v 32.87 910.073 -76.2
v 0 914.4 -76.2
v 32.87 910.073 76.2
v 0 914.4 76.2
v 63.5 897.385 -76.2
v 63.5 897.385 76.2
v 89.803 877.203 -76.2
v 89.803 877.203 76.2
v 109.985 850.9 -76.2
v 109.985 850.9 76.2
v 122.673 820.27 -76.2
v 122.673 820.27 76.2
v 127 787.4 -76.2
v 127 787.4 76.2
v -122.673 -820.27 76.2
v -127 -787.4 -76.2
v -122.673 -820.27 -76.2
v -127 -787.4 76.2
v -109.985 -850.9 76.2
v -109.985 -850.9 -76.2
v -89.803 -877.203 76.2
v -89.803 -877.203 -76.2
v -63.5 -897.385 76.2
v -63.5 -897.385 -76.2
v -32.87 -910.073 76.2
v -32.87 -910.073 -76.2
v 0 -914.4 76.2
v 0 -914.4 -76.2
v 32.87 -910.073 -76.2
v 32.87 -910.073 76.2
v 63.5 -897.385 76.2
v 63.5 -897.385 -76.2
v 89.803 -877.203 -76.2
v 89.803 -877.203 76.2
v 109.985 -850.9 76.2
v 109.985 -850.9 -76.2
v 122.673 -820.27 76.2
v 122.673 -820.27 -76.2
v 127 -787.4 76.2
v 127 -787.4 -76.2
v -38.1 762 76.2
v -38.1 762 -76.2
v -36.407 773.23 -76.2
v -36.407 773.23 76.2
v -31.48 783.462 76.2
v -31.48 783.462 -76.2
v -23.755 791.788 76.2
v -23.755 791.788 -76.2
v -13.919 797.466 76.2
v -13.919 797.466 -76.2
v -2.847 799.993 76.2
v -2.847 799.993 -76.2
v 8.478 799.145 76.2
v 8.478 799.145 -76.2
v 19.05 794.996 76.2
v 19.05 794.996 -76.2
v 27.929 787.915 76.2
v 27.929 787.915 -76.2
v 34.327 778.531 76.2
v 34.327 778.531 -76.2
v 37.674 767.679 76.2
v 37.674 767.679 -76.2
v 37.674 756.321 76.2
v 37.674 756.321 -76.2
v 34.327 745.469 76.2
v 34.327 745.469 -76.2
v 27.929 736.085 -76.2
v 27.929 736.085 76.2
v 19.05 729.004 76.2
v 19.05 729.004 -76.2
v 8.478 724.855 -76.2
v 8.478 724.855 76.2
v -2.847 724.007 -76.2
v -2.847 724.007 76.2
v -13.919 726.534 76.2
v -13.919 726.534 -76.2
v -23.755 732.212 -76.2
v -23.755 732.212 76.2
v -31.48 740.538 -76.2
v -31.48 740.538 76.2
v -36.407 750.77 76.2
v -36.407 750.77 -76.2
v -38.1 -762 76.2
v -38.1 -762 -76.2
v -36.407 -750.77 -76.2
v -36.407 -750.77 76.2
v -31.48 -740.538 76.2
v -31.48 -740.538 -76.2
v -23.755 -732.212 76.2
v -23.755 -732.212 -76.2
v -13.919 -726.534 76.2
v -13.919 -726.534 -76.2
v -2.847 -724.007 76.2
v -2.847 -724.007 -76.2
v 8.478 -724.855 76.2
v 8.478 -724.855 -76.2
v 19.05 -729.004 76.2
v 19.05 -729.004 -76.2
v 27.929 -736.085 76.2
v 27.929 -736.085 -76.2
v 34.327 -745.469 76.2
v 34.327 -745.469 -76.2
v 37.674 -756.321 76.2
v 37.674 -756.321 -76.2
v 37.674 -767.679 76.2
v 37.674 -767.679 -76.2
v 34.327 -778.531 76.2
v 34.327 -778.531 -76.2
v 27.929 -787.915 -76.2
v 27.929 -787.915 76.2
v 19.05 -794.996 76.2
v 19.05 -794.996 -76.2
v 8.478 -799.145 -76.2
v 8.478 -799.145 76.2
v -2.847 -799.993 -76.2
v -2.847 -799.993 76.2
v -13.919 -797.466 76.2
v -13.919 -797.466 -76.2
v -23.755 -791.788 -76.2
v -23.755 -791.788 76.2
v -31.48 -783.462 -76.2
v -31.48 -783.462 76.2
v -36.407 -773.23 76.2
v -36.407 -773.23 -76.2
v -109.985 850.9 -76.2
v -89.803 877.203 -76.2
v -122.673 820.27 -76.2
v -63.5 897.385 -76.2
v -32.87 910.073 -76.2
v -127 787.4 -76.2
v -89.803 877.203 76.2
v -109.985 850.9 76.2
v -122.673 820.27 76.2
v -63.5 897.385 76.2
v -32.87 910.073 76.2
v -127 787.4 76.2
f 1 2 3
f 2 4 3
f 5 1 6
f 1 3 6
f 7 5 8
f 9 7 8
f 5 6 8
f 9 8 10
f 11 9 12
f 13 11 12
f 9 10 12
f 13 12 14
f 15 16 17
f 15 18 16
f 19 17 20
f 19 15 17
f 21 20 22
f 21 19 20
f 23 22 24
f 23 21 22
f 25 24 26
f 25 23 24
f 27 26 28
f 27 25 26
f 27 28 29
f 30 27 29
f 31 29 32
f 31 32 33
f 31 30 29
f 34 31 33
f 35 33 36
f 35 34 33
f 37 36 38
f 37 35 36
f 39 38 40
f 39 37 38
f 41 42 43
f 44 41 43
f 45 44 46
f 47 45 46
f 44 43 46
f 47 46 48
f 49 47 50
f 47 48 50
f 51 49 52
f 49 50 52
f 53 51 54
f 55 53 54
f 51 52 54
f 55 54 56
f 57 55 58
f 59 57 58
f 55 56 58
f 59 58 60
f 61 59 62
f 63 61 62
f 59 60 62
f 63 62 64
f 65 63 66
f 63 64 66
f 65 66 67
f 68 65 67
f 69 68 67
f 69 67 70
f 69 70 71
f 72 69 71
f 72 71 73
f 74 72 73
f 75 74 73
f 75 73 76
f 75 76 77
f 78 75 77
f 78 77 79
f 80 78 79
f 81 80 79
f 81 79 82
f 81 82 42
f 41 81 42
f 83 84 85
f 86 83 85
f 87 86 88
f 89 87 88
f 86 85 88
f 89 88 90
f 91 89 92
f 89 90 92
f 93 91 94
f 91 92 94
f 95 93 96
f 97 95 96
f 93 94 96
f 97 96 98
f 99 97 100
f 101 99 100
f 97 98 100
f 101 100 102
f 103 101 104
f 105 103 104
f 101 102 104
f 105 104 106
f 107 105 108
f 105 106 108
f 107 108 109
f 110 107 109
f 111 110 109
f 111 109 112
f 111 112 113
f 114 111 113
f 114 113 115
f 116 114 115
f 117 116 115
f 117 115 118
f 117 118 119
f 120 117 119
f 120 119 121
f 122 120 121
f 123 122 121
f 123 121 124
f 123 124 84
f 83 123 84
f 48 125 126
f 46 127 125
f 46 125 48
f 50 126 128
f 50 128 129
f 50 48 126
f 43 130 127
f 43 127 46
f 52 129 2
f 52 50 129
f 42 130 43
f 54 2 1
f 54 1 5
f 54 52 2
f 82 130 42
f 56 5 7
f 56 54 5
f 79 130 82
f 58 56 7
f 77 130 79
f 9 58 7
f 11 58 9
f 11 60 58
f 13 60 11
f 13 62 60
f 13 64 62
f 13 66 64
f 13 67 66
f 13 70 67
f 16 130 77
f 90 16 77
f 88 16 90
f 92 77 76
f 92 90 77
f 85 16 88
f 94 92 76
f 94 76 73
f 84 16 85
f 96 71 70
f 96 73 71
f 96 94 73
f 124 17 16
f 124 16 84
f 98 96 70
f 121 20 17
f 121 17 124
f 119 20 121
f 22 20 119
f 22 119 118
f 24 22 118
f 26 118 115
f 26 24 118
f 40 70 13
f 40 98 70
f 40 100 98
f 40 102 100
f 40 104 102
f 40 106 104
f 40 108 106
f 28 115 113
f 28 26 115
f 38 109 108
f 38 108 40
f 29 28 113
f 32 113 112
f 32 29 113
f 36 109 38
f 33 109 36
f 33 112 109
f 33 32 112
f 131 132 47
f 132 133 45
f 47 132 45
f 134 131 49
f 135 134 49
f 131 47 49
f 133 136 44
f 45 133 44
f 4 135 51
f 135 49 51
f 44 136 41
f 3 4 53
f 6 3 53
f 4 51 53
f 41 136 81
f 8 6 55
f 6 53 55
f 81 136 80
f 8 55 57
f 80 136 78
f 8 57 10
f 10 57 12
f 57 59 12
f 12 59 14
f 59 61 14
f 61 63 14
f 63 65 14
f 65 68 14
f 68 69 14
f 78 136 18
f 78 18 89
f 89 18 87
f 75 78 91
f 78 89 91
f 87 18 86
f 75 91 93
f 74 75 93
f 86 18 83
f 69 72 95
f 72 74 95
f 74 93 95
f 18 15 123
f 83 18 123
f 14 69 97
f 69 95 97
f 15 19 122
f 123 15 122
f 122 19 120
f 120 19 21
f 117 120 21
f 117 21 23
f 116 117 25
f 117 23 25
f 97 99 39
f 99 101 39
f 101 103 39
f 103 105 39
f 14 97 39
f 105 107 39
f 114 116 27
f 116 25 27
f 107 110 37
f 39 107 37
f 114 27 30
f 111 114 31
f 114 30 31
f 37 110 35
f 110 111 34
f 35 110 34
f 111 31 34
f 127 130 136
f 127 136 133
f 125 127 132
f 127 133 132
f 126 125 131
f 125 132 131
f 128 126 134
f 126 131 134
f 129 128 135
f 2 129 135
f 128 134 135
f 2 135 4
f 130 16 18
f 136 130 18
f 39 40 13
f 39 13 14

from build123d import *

# Parameters (mm, degrees)
F0_W     = 254
F0_H     = 152.4
F1_DEPTH = 914.4
F3_D     = 76.2
F4_R     = 126.99999


# Not quite as in the source:
# - a fillet or chamfer is up to 0.001 mm smaller than in the source, because OpenCascade refuses the exact size


with BuildPart() as f1:
    # F0 (on Front) → F1 (new body, symmetric)
    with BuildSketch(Plane.XZ):
        Rectangle(F0_W, F0_H)
    extrude(amount=F1_DEPTH, both=True)

    # F3 (through all)
    with Locations(Plane.XY.offset(76.2)):
        with Locations((0, 762), (0, -762)):
            Hole(F3_D / 2)

    # F4 (radius 127 in the source; OpenCascade refuses exactly that, so slightly less here)
    f4_edges = [f1.edges().sort_by_distance(p)[0] for p in [
        (127, -914.4, 0),
        (-127, -914.4, 0),
        (127, 914.4, 0),
        (-127, 914.4, 0),
    ]]
    fillet(f4_edges, radius=F4_R)


solid = f1.part
